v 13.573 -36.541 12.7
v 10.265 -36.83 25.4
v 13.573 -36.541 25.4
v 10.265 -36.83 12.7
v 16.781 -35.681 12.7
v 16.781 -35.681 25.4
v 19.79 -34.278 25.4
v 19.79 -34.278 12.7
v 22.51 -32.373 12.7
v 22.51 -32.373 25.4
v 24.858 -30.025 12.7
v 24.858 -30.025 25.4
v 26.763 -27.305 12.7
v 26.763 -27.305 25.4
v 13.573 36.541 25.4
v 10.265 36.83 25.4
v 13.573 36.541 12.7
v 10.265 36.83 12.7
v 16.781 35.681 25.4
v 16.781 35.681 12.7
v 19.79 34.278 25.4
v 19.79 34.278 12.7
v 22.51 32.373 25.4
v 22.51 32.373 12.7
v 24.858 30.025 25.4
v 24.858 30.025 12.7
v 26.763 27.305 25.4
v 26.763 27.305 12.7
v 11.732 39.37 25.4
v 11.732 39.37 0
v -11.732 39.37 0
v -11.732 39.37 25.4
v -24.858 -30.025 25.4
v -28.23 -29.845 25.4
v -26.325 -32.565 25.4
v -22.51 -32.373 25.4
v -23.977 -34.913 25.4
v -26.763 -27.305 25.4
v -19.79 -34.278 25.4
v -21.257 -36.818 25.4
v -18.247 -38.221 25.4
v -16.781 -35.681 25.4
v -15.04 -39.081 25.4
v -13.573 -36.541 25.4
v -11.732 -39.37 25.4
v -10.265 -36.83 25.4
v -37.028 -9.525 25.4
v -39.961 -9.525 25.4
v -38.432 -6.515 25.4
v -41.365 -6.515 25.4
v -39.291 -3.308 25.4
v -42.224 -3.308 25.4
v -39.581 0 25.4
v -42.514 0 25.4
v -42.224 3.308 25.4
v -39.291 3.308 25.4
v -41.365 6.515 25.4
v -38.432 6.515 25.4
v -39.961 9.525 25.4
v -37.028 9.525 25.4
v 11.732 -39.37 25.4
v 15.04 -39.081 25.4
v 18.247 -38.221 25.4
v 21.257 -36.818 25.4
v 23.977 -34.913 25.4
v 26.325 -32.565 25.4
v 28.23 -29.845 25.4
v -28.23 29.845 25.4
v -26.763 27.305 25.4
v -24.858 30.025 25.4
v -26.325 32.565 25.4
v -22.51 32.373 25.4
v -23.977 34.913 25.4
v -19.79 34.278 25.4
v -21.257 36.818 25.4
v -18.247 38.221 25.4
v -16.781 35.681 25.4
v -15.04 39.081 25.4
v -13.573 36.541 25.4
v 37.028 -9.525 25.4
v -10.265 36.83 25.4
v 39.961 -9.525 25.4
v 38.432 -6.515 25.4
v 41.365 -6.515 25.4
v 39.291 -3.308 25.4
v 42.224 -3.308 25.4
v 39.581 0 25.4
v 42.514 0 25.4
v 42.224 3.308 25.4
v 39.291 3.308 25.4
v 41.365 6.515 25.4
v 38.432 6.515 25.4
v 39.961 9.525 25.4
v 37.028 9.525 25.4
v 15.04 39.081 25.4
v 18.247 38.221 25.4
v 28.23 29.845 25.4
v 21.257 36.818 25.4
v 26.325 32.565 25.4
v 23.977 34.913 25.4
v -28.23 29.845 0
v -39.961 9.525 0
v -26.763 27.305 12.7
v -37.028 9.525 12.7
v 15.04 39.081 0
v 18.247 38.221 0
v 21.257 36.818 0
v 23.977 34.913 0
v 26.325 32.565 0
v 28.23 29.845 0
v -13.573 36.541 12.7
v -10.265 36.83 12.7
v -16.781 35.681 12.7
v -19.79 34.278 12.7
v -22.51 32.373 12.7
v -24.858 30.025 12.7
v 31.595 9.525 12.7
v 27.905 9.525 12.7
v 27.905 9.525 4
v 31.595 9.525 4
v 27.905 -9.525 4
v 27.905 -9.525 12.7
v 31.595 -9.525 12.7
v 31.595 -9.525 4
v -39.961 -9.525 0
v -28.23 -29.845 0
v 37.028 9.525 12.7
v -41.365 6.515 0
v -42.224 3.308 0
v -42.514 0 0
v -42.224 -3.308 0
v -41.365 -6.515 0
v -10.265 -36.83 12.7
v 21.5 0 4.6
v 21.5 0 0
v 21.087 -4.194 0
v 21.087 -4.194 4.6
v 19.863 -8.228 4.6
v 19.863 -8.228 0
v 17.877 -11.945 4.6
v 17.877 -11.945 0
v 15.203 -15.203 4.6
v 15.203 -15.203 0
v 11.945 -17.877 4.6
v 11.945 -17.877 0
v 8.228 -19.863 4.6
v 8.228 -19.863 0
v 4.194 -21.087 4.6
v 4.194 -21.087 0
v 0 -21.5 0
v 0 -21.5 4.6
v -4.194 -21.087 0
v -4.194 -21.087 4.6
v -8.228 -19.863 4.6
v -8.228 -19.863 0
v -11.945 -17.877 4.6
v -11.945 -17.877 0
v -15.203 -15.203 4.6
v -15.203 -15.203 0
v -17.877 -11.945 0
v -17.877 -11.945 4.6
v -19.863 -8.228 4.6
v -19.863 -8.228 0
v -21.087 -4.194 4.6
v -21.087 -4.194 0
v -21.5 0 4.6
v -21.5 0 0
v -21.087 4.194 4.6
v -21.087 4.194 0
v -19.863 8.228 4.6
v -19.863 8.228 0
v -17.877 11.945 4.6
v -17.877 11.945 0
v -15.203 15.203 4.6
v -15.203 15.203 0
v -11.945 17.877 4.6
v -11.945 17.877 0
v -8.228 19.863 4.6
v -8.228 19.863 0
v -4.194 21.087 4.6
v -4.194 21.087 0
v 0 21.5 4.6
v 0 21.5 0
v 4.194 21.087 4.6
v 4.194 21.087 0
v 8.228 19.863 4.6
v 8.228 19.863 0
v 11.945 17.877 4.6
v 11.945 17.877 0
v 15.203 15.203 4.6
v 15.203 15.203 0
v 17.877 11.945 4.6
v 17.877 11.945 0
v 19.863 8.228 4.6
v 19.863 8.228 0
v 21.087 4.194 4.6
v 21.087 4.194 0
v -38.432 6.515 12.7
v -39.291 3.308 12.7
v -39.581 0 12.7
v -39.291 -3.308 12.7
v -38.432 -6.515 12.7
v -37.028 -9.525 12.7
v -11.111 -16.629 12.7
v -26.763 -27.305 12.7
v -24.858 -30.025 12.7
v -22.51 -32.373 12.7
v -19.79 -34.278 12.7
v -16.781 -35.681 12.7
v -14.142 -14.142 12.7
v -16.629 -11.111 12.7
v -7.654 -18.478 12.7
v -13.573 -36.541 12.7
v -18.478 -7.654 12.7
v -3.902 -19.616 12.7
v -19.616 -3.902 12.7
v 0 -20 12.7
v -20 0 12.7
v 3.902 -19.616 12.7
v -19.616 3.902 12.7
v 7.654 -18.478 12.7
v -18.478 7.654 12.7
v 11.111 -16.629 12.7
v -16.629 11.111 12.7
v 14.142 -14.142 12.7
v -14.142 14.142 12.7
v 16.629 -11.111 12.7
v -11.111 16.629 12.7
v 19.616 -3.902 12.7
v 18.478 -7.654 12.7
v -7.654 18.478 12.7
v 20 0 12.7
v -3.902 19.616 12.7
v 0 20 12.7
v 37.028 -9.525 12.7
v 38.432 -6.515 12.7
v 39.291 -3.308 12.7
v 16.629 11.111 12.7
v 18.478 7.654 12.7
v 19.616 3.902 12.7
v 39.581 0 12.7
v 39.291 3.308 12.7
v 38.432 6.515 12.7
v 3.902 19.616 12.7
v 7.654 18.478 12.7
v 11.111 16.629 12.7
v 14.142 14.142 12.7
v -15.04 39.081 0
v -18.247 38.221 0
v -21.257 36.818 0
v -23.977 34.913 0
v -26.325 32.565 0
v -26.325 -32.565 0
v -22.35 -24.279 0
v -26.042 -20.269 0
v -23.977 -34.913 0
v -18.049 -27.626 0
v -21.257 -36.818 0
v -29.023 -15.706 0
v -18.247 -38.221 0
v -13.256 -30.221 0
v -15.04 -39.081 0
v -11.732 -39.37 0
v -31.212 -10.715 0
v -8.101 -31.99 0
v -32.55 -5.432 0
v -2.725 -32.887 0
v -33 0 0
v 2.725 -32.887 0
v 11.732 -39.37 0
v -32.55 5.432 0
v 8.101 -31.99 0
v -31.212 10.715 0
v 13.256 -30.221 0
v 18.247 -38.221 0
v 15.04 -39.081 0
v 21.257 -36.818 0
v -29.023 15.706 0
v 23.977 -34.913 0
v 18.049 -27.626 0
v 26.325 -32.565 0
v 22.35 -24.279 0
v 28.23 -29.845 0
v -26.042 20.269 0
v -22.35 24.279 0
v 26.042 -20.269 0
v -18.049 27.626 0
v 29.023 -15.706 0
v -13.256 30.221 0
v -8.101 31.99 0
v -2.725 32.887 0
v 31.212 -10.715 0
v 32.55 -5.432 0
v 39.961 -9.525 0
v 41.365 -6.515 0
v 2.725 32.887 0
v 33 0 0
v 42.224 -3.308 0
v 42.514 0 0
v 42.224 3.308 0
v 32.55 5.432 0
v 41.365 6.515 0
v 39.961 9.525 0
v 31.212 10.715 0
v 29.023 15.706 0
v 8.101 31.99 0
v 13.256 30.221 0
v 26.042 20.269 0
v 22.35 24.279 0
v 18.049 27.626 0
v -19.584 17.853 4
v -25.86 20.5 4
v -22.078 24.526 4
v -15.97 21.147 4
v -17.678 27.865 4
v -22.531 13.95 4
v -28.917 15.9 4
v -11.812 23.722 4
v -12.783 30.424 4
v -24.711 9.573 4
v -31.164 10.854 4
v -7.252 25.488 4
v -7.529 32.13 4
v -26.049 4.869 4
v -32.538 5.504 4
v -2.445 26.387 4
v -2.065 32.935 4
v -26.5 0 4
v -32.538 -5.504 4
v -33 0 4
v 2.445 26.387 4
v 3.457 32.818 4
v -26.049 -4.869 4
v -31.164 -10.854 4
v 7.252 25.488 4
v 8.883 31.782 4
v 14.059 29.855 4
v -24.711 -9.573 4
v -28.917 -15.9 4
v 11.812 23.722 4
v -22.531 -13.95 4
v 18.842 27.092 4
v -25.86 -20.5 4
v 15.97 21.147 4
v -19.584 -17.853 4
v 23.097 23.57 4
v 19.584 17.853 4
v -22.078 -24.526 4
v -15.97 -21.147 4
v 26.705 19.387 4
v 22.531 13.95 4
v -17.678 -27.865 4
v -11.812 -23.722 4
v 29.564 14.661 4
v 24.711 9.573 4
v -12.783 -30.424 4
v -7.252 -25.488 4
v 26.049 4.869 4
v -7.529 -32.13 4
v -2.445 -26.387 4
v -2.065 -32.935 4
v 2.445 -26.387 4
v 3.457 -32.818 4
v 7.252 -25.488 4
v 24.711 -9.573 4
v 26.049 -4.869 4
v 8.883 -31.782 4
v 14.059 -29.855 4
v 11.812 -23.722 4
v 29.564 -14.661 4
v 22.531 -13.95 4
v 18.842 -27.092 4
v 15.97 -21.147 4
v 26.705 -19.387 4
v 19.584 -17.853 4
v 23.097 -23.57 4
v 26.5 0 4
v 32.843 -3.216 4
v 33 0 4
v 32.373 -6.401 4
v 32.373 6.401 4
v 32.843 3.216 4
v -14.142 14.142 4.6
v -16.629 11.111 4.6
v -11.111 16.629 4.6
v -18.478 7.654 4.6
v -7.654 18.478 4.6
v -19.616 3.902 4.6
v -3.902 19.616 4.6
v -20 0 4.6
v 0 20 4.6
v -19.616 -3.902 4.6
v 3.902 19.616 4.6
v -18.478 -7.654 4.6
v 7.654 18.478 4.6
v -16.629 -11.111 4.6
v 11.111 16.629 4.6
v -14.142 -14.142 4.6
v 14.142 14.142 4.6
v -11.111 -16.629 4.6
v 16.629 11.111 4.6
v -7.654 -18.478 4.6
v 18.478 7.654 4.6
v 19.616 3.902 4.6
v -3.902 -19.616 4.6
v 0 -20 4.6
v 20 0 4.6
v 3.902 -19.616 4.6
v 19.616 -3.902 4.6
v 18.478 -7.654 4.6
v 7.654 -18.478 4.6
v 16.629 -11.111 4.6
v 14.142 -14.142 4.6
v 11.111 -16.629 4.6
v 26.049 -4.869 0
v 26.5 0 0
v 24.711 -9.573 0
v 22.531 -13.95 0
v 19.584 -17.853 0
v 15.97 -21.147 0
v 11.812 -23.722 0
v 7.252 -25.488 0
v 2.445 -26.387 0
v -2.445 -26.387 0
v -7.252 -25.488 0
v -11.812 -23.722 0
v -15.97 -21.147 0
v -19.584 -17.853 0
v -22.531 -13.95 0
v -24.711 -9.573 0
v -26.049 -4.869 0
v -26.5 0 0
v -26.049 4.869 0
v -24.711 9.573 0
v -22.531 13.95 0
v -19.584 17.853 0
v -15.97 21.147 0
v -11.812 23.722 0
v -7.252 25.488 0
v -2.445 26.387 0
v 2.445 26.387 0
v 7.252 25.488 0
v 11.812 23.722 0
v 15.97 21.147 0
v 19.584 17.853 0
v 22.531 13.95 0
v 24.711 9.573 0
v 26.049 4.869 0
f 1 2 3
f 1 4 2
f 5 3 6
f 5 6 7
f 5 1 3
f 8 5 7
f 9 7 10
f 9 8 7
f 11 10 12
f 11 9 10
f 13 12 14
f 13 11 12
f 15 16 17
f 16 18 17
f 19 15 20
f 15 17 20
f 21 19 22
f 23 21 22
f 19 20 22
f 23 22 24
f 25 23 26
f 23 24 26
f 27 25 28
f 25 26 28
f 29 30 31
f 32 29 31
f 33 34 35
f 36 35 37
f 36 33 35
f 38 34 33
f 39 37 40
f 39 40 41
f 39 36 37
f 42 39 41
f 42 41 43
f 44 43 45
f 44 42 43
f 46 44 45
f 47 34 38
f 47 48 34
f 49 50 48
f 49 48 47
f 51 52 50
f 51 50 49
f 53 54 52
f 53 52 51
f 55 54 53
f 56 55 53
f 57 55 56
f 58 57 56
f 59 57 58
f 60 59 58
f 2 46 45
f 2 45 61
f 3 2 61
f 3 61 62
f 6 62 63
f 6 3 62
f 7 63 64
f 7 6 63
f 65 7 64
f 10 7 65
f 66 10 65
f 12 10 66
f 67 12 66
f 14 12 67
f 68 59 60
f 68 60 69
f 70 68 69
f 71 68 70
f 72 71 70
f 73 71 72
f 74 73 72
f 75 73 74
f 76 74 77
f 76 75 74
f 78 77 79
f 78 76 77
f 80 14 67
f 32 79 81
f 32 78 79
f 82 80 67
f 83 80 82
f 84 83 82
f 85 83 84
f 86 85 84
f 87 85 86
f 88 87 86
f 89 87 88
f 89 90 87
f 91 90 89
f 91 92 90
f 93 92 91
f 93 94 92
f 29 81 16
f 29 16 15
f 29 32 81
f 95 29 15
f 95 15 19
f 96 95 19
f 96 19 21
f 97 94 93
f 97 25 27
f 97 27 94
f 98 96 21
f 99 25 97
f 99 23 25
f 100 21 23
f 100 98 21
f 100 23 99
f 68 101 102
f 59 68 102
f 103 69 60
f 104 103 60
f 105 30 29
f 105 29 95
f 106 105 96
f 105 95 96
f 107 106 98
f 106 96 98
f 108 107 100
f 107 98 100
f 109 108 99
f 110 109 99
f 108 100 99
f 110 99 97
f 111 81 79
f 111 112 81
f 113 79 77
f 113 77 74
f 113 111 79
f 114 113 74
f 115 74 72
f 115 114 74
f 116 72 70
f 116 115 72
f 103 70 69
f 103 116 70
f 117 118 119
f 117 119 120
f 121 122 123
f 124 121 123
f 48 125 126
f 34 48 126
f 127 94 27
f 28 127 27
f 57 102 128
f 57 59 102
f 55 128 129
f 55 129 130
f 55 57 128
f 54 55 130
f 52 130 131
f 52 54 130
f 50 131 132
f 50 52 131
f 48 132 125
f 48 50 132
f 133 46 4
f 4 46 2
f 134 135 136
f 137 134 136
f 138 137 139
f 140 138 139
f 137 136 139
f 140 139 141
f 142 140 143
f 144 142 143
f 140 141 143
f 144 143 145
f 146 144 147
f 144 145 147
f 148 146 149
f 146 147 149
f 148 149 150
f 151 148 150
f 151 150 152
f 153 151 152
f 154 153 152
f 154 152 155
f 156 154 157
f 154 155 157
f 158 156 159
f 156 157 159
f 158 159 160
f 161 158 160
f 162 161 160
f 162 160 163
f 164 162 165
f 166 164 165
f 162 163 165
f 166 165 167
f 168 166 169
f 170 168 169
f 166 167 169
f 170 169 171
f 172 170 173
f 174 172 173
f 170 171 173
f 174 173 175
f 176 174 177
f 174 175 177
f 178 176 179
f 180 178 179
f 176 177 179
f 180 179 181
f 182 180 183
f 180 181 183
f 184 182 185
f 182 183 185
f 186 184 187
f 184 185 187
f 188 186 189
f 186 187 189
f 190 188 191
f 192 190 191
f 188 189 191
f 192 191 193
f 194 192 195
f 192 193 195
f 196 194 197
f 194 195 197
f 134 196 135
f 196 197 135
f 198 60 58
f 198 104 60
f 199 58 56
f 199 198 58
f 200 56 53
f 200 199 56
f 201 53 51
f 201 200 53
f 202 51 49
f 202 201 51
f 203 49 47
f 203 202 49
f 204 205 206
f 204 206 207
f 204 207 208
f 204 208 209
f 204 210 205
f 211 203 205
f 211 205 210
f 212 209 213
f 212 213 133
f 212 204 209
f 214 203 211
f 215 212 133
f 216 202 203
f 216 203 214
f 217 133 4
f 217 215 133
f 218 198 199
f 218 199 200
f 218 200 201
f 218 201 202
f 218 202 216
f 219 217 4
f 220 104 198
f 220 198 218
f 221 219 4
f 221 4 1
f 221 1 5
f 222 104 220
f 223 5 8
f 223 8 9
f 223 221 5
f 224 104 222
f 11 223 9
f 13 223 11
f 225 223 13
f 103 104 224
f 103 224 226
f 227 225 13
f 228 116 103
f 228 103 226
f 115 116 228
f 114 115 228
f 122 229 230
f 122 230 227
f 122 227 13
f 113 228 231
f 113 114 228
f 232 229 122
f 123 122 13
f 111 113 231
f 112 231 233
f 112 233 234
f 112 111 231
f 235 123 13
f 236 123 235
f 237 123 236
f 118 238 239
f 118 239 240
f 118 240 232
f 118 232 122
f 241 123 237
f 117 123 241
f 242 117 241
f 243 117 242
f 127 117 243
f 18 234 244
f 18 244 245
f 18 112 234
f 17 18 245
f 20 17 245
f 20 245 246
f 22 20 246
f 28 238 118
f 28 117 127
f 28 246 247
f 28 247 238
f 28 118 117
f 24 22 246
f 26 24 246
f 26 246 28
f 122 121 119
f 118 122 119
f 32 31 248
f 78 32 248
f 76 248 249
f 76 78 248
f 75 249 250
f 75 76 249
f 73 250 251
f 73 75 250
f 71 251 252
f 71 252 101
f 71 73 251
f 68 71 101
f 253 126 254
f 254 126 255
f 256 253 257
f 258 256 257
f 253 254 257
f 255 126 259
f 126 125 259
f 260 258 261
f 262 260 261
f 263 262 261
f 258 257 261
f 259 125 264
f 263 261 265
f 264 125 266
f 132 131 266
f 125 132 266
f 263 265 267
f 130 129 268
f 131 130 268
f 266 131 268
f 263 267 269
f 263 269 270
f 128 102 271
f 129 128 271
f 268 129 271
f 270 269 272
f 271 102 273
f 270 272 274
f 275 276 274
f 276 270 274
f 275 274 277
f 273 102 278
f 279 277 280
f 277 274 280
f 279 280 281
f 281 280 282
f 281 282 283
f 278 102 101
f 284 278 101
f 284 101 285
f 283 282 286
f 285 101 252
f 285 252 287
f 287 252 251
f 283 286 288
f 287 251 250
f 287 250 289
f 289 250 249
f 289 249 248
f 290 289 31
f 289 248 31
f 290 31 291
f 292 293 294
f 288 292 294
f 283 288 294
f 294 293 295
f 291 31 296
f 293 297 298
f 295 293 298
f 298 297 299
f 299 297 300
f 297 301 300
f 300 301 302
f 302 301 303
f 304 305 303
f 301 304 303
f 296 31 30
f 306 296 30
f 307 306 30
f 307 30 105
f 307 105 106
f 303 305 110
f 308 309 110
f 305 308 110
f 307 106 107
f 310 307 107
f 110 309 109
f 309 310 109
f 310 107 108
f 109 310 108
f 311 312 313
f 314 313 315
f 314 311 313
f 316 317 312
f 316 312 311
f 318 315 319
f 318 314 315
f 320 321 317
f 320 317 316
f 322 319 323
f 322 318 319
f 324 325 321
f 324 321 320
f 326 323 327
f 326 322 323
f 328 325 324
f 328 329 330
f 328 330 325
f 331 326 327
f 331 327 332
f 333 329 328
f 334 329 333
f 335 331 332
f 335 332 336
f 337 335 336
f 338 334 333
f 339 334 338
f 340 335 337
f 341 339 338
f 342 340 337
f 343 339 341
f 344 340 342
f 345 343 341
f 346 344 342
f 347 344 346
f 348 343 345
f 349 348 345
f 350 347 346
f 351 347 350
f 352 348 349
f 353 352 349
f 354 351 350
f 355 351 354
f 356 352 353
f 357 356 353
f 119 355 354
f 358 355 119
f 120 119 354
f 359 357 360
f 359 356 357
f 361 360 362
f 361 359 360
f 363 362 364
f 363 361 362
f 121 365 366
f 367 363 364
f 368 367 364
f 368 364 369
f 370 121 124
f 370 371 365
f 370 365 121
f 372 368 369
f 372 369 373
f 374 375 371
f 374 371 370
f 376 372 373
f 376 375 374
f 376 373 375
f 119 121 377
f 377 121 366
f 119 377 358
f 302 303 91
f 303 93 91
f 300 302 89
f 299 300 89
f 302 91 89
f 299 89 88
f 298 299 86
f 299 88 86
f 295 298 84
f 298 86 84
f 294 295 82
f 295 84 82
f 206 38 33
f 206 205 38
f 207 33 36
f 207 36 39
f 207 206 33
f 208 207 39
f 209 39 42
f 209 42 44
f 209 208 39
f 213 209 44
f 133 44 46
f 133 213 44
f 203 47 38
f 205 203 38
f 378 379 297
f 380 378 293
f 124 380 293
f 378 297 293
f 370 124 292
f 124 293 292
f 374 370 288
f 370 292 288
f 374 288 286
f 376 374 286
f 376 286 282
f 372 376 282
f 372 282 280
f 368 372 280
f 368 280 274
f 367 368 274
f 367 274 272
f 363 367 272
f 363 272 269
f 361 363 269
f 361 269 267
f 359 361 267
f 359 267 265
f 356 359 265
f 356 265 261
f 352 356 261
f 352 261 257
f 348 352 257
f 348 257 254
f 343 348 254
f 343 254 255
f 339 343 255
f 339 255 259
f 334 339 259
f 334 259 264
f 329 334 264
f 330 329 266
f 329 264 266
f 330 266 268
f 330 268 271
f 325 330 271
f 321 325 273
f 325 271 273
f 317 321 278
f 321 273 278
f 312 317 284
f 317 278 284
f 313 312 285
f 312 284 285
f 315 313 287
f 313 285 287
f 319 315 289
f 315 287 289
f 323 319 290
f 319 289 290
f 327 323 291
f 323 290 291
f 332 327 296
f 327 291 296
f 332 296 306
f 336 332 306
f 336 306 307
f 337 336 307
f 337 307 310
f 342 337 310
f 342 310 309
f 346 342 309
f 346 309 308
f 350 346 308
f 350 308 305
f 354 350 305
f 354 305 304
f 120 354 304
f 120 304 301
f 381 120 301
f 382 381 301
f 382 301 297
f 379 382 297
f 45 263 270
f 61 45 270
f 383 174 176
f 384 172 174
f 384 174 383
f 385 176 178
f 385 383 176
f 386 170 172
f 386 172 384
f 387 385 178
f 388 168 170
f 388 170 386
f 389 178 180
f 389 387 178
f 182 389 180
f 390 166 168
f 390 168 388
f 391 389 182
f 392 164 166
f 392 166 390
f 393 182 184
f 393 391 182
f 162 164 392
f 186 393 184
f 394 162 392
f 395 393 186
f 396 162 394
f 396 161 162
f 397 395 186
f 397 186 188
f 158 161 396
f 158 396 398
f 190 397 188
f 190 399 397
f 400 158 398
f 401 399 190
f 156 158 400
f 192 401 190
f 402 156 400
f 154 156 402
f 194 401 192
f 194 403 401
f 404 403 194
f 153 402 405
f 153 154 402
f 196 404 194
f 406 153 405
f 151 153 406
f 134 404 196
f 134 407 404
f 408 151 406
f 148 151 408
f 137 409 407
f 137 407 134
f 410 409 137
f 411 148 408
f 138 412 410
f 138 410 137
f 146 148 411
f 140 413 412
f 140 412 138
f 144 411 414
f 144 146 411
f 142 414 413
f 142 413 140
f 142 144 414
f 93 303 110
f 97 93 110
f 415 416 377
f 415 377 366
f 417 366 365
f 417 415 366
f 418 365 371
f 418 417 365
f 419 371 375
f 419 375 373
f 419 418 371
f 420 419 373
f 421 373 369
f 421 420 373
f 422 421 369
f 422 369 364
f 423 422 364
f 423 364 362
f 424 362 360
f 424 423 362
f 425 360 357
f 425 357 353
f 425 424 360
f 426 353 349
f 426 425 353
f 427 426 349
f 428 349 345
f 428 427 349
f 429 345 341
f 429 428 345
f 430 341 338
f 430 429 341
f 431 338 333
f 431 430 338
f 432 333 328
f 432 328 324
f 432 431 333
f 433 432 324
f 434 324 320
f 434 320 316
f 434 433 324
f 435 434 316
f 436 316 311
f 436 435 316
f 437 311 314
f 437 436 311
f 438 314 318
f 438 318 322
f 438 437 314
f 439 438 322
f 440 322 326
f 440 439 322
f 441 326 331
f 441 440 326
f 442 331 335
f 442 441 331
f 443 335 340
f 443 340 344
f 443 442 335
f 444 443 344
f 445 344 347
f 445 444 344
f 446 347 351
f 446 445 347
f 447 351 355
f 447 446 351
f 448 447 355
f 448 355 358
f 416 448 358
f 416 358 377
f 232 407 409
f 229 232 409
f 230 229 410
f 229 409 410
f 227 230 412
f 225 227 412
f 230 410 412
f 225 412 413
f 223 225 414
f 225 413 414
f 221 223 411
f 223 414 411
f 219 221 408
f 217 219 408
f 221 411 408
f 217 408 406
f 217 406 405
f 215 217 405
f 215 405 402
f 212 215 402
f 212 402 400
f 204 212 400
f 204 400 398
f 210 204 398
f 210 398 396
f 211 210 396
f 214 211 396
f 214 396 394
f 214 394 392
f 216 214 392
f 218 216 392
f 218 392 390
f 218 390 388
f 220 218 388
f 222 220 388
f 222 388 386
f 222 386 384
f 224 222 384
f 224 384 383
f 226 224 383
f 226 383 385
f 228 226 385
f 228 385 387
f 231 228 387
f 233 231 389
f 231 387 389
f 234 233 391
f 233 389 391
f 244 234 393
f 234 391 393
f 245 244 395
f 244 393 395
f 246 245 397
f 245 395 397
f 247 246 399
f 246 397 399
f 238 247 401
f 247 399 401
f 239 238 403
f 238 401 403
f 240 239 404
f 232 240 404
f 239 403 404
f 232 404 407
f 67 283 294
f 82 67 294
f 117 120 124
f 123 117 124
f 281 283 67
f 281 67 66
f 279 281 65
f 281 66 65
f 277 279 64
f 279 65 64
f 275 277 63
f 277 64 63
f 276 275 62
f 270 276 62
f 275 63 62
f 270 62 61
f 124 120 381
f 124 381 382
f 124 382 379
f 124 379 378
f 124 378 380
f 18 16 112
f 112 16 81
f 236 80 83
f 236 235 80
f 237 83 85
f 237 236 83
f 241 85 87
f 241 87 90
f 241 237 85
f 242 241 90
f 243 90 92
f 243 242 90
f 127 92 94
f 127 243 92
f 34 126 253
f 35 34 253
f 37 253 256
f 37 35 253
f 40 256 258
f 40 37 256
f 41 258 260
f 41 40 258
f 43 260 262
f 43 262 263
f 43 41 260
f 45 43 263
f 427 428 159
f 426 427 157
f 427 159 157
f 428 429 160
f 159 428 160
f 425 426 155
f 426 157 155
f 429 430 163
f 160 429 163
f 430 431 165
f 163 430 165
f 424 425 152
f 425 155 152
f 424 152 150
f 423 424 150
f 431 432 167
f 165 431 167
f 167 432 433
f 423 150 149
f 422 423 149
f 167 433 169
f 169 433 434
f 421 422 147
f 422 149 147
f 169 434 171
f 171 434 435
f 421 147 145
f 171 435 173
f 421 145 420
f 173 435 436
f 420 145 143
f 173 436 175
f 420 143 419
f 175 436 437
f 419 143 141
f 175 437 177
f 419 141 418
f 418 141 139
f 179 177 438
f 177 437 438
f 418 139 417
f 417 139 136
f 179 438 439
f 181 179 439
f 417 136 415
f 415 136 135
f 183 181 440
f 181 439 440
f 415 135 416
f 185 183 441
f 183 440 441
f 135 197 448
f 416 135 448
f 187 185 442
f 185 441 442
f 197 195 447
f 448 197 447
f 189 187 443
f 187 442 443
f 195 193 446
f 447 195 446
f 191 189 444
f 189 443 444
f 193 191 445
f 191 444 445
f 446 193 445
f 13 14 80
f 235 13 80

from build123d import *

# Parameters (mm, degrees)
F1_DEPTH  = 25.4
F3_DEPTH  = 12.7
F4_R      = 19.05
F5_R      = 19.05
F6_R      = 20
F7_DEPTH  = 12.7
F8_R      = 21.5
F9_DEPTH  = 4.6
F10_R     = 33
F10_R_2   = 26.5
F11_DEPTH = 4
F12_W     = 3.69096
F12_H     = 9.525
F13_DEPTH = 8.7


with BuildPart() as f1:
    # F0 (on Top) → F1 (new body)
    with BuildSketch(Plane.XY):
        Polygon((22.73028, 39.37), (-22.73028, 39.37), (-45.46056, 0), (-22.73028, -39.37), (22.73028, -39.37), (45.46056, 0), align=None)
    extrude(amount=F1_DEPTH)

    # F2 (on face) → F3 (cut)
    with BuildSketch(Plane.XY.offset(25.4)):
        Polygon((21.26381, 36.83), (-21.26381, 36.83), (-42.527621, 0), (-21.26381, -36.83), (21.26381, -36.83), (42.527621, 0), align=None)
    extrude(amount=-F3_DEPTH, mode=Mode.SUBTRACT)

    # F4
    f4_edges = [f1.edges().sort_by_distance(p)[0] for p in [
        (21.26381, 36.83, 19.05),
        (-21.26381, 36.83, 19.05),
        (-42.527621, 0, 19.05),
        (42.527621, 0, 19.05),
        (21.26381, -36.83, 19.05),
        (-21.26381, -36.83, 19.05),
    ]]
    fillet(f4_edges, radius=F4_R)

    # F5
    f5_edges = [f1.edges().sort_by_distance(p)[0] for p in [
        (-22.73028, -39.37, 12.7),
        (22.73028, -39.37, 12.7),
        (45.46056, 0, 12.7),
        (-45.46056, 0, 12.7),
        (-22.73028, 39.37, 12.7),
        (22.73028, 39.37, 12.7),
    ]]
    fillet(f5_edges, radius=F5_R)

    # F6 (on face) → F7 (cut, through all)
    with BuildSketch(Plane(origin=(0, 0, 0), x_dir=(1, 0, 0), z_dir=(0, 0, -1))):
        Circle(F6_R)
    extrude(amount=-F7_DEPTH, mode=Mode.SUBTRACT)

    # F8 (on face) → F9 (cut)
    with BuildSketch(Plane(origin=(0, 0, 0), x_dir=(1, 0, 0), z_dir=(0, 0, -1))):
        Circle(F8_R)
    extrude(amount=-F9_DEPTH, mode=Mode.SUBTRACT)

    # F10 (on face) → F11 (cut)
    with BuildSketch(Plane(origin=(0, 0, 0), x_dir=(1, 0, 0), z_dir=(0, 0, -1))):
        Circle(F10_R)
        Circle(F10_R_2, mode=Mode.SUBTRACT)
    extrude(amount=-F11_DEPTH, mode=Mode.SUBTRACT)

    # F12 (on face) → F13 (cut, through all)
    with BuildSketch(Plane(origin=(0, 0, 4), x_dir=(1, 0, 0), z_dir=(0, 0, -1))):
        with Locations((29.75, 4.7625)):
            Rectangle(F12_W, F12_H)
        with Locations((29.75, -4.7625)):
            Rectangle(F12_W, F12_H)
    extrude(amount=-F13_DEPTH, mode=Mode.SUBTRACT)


solid = f1.part
